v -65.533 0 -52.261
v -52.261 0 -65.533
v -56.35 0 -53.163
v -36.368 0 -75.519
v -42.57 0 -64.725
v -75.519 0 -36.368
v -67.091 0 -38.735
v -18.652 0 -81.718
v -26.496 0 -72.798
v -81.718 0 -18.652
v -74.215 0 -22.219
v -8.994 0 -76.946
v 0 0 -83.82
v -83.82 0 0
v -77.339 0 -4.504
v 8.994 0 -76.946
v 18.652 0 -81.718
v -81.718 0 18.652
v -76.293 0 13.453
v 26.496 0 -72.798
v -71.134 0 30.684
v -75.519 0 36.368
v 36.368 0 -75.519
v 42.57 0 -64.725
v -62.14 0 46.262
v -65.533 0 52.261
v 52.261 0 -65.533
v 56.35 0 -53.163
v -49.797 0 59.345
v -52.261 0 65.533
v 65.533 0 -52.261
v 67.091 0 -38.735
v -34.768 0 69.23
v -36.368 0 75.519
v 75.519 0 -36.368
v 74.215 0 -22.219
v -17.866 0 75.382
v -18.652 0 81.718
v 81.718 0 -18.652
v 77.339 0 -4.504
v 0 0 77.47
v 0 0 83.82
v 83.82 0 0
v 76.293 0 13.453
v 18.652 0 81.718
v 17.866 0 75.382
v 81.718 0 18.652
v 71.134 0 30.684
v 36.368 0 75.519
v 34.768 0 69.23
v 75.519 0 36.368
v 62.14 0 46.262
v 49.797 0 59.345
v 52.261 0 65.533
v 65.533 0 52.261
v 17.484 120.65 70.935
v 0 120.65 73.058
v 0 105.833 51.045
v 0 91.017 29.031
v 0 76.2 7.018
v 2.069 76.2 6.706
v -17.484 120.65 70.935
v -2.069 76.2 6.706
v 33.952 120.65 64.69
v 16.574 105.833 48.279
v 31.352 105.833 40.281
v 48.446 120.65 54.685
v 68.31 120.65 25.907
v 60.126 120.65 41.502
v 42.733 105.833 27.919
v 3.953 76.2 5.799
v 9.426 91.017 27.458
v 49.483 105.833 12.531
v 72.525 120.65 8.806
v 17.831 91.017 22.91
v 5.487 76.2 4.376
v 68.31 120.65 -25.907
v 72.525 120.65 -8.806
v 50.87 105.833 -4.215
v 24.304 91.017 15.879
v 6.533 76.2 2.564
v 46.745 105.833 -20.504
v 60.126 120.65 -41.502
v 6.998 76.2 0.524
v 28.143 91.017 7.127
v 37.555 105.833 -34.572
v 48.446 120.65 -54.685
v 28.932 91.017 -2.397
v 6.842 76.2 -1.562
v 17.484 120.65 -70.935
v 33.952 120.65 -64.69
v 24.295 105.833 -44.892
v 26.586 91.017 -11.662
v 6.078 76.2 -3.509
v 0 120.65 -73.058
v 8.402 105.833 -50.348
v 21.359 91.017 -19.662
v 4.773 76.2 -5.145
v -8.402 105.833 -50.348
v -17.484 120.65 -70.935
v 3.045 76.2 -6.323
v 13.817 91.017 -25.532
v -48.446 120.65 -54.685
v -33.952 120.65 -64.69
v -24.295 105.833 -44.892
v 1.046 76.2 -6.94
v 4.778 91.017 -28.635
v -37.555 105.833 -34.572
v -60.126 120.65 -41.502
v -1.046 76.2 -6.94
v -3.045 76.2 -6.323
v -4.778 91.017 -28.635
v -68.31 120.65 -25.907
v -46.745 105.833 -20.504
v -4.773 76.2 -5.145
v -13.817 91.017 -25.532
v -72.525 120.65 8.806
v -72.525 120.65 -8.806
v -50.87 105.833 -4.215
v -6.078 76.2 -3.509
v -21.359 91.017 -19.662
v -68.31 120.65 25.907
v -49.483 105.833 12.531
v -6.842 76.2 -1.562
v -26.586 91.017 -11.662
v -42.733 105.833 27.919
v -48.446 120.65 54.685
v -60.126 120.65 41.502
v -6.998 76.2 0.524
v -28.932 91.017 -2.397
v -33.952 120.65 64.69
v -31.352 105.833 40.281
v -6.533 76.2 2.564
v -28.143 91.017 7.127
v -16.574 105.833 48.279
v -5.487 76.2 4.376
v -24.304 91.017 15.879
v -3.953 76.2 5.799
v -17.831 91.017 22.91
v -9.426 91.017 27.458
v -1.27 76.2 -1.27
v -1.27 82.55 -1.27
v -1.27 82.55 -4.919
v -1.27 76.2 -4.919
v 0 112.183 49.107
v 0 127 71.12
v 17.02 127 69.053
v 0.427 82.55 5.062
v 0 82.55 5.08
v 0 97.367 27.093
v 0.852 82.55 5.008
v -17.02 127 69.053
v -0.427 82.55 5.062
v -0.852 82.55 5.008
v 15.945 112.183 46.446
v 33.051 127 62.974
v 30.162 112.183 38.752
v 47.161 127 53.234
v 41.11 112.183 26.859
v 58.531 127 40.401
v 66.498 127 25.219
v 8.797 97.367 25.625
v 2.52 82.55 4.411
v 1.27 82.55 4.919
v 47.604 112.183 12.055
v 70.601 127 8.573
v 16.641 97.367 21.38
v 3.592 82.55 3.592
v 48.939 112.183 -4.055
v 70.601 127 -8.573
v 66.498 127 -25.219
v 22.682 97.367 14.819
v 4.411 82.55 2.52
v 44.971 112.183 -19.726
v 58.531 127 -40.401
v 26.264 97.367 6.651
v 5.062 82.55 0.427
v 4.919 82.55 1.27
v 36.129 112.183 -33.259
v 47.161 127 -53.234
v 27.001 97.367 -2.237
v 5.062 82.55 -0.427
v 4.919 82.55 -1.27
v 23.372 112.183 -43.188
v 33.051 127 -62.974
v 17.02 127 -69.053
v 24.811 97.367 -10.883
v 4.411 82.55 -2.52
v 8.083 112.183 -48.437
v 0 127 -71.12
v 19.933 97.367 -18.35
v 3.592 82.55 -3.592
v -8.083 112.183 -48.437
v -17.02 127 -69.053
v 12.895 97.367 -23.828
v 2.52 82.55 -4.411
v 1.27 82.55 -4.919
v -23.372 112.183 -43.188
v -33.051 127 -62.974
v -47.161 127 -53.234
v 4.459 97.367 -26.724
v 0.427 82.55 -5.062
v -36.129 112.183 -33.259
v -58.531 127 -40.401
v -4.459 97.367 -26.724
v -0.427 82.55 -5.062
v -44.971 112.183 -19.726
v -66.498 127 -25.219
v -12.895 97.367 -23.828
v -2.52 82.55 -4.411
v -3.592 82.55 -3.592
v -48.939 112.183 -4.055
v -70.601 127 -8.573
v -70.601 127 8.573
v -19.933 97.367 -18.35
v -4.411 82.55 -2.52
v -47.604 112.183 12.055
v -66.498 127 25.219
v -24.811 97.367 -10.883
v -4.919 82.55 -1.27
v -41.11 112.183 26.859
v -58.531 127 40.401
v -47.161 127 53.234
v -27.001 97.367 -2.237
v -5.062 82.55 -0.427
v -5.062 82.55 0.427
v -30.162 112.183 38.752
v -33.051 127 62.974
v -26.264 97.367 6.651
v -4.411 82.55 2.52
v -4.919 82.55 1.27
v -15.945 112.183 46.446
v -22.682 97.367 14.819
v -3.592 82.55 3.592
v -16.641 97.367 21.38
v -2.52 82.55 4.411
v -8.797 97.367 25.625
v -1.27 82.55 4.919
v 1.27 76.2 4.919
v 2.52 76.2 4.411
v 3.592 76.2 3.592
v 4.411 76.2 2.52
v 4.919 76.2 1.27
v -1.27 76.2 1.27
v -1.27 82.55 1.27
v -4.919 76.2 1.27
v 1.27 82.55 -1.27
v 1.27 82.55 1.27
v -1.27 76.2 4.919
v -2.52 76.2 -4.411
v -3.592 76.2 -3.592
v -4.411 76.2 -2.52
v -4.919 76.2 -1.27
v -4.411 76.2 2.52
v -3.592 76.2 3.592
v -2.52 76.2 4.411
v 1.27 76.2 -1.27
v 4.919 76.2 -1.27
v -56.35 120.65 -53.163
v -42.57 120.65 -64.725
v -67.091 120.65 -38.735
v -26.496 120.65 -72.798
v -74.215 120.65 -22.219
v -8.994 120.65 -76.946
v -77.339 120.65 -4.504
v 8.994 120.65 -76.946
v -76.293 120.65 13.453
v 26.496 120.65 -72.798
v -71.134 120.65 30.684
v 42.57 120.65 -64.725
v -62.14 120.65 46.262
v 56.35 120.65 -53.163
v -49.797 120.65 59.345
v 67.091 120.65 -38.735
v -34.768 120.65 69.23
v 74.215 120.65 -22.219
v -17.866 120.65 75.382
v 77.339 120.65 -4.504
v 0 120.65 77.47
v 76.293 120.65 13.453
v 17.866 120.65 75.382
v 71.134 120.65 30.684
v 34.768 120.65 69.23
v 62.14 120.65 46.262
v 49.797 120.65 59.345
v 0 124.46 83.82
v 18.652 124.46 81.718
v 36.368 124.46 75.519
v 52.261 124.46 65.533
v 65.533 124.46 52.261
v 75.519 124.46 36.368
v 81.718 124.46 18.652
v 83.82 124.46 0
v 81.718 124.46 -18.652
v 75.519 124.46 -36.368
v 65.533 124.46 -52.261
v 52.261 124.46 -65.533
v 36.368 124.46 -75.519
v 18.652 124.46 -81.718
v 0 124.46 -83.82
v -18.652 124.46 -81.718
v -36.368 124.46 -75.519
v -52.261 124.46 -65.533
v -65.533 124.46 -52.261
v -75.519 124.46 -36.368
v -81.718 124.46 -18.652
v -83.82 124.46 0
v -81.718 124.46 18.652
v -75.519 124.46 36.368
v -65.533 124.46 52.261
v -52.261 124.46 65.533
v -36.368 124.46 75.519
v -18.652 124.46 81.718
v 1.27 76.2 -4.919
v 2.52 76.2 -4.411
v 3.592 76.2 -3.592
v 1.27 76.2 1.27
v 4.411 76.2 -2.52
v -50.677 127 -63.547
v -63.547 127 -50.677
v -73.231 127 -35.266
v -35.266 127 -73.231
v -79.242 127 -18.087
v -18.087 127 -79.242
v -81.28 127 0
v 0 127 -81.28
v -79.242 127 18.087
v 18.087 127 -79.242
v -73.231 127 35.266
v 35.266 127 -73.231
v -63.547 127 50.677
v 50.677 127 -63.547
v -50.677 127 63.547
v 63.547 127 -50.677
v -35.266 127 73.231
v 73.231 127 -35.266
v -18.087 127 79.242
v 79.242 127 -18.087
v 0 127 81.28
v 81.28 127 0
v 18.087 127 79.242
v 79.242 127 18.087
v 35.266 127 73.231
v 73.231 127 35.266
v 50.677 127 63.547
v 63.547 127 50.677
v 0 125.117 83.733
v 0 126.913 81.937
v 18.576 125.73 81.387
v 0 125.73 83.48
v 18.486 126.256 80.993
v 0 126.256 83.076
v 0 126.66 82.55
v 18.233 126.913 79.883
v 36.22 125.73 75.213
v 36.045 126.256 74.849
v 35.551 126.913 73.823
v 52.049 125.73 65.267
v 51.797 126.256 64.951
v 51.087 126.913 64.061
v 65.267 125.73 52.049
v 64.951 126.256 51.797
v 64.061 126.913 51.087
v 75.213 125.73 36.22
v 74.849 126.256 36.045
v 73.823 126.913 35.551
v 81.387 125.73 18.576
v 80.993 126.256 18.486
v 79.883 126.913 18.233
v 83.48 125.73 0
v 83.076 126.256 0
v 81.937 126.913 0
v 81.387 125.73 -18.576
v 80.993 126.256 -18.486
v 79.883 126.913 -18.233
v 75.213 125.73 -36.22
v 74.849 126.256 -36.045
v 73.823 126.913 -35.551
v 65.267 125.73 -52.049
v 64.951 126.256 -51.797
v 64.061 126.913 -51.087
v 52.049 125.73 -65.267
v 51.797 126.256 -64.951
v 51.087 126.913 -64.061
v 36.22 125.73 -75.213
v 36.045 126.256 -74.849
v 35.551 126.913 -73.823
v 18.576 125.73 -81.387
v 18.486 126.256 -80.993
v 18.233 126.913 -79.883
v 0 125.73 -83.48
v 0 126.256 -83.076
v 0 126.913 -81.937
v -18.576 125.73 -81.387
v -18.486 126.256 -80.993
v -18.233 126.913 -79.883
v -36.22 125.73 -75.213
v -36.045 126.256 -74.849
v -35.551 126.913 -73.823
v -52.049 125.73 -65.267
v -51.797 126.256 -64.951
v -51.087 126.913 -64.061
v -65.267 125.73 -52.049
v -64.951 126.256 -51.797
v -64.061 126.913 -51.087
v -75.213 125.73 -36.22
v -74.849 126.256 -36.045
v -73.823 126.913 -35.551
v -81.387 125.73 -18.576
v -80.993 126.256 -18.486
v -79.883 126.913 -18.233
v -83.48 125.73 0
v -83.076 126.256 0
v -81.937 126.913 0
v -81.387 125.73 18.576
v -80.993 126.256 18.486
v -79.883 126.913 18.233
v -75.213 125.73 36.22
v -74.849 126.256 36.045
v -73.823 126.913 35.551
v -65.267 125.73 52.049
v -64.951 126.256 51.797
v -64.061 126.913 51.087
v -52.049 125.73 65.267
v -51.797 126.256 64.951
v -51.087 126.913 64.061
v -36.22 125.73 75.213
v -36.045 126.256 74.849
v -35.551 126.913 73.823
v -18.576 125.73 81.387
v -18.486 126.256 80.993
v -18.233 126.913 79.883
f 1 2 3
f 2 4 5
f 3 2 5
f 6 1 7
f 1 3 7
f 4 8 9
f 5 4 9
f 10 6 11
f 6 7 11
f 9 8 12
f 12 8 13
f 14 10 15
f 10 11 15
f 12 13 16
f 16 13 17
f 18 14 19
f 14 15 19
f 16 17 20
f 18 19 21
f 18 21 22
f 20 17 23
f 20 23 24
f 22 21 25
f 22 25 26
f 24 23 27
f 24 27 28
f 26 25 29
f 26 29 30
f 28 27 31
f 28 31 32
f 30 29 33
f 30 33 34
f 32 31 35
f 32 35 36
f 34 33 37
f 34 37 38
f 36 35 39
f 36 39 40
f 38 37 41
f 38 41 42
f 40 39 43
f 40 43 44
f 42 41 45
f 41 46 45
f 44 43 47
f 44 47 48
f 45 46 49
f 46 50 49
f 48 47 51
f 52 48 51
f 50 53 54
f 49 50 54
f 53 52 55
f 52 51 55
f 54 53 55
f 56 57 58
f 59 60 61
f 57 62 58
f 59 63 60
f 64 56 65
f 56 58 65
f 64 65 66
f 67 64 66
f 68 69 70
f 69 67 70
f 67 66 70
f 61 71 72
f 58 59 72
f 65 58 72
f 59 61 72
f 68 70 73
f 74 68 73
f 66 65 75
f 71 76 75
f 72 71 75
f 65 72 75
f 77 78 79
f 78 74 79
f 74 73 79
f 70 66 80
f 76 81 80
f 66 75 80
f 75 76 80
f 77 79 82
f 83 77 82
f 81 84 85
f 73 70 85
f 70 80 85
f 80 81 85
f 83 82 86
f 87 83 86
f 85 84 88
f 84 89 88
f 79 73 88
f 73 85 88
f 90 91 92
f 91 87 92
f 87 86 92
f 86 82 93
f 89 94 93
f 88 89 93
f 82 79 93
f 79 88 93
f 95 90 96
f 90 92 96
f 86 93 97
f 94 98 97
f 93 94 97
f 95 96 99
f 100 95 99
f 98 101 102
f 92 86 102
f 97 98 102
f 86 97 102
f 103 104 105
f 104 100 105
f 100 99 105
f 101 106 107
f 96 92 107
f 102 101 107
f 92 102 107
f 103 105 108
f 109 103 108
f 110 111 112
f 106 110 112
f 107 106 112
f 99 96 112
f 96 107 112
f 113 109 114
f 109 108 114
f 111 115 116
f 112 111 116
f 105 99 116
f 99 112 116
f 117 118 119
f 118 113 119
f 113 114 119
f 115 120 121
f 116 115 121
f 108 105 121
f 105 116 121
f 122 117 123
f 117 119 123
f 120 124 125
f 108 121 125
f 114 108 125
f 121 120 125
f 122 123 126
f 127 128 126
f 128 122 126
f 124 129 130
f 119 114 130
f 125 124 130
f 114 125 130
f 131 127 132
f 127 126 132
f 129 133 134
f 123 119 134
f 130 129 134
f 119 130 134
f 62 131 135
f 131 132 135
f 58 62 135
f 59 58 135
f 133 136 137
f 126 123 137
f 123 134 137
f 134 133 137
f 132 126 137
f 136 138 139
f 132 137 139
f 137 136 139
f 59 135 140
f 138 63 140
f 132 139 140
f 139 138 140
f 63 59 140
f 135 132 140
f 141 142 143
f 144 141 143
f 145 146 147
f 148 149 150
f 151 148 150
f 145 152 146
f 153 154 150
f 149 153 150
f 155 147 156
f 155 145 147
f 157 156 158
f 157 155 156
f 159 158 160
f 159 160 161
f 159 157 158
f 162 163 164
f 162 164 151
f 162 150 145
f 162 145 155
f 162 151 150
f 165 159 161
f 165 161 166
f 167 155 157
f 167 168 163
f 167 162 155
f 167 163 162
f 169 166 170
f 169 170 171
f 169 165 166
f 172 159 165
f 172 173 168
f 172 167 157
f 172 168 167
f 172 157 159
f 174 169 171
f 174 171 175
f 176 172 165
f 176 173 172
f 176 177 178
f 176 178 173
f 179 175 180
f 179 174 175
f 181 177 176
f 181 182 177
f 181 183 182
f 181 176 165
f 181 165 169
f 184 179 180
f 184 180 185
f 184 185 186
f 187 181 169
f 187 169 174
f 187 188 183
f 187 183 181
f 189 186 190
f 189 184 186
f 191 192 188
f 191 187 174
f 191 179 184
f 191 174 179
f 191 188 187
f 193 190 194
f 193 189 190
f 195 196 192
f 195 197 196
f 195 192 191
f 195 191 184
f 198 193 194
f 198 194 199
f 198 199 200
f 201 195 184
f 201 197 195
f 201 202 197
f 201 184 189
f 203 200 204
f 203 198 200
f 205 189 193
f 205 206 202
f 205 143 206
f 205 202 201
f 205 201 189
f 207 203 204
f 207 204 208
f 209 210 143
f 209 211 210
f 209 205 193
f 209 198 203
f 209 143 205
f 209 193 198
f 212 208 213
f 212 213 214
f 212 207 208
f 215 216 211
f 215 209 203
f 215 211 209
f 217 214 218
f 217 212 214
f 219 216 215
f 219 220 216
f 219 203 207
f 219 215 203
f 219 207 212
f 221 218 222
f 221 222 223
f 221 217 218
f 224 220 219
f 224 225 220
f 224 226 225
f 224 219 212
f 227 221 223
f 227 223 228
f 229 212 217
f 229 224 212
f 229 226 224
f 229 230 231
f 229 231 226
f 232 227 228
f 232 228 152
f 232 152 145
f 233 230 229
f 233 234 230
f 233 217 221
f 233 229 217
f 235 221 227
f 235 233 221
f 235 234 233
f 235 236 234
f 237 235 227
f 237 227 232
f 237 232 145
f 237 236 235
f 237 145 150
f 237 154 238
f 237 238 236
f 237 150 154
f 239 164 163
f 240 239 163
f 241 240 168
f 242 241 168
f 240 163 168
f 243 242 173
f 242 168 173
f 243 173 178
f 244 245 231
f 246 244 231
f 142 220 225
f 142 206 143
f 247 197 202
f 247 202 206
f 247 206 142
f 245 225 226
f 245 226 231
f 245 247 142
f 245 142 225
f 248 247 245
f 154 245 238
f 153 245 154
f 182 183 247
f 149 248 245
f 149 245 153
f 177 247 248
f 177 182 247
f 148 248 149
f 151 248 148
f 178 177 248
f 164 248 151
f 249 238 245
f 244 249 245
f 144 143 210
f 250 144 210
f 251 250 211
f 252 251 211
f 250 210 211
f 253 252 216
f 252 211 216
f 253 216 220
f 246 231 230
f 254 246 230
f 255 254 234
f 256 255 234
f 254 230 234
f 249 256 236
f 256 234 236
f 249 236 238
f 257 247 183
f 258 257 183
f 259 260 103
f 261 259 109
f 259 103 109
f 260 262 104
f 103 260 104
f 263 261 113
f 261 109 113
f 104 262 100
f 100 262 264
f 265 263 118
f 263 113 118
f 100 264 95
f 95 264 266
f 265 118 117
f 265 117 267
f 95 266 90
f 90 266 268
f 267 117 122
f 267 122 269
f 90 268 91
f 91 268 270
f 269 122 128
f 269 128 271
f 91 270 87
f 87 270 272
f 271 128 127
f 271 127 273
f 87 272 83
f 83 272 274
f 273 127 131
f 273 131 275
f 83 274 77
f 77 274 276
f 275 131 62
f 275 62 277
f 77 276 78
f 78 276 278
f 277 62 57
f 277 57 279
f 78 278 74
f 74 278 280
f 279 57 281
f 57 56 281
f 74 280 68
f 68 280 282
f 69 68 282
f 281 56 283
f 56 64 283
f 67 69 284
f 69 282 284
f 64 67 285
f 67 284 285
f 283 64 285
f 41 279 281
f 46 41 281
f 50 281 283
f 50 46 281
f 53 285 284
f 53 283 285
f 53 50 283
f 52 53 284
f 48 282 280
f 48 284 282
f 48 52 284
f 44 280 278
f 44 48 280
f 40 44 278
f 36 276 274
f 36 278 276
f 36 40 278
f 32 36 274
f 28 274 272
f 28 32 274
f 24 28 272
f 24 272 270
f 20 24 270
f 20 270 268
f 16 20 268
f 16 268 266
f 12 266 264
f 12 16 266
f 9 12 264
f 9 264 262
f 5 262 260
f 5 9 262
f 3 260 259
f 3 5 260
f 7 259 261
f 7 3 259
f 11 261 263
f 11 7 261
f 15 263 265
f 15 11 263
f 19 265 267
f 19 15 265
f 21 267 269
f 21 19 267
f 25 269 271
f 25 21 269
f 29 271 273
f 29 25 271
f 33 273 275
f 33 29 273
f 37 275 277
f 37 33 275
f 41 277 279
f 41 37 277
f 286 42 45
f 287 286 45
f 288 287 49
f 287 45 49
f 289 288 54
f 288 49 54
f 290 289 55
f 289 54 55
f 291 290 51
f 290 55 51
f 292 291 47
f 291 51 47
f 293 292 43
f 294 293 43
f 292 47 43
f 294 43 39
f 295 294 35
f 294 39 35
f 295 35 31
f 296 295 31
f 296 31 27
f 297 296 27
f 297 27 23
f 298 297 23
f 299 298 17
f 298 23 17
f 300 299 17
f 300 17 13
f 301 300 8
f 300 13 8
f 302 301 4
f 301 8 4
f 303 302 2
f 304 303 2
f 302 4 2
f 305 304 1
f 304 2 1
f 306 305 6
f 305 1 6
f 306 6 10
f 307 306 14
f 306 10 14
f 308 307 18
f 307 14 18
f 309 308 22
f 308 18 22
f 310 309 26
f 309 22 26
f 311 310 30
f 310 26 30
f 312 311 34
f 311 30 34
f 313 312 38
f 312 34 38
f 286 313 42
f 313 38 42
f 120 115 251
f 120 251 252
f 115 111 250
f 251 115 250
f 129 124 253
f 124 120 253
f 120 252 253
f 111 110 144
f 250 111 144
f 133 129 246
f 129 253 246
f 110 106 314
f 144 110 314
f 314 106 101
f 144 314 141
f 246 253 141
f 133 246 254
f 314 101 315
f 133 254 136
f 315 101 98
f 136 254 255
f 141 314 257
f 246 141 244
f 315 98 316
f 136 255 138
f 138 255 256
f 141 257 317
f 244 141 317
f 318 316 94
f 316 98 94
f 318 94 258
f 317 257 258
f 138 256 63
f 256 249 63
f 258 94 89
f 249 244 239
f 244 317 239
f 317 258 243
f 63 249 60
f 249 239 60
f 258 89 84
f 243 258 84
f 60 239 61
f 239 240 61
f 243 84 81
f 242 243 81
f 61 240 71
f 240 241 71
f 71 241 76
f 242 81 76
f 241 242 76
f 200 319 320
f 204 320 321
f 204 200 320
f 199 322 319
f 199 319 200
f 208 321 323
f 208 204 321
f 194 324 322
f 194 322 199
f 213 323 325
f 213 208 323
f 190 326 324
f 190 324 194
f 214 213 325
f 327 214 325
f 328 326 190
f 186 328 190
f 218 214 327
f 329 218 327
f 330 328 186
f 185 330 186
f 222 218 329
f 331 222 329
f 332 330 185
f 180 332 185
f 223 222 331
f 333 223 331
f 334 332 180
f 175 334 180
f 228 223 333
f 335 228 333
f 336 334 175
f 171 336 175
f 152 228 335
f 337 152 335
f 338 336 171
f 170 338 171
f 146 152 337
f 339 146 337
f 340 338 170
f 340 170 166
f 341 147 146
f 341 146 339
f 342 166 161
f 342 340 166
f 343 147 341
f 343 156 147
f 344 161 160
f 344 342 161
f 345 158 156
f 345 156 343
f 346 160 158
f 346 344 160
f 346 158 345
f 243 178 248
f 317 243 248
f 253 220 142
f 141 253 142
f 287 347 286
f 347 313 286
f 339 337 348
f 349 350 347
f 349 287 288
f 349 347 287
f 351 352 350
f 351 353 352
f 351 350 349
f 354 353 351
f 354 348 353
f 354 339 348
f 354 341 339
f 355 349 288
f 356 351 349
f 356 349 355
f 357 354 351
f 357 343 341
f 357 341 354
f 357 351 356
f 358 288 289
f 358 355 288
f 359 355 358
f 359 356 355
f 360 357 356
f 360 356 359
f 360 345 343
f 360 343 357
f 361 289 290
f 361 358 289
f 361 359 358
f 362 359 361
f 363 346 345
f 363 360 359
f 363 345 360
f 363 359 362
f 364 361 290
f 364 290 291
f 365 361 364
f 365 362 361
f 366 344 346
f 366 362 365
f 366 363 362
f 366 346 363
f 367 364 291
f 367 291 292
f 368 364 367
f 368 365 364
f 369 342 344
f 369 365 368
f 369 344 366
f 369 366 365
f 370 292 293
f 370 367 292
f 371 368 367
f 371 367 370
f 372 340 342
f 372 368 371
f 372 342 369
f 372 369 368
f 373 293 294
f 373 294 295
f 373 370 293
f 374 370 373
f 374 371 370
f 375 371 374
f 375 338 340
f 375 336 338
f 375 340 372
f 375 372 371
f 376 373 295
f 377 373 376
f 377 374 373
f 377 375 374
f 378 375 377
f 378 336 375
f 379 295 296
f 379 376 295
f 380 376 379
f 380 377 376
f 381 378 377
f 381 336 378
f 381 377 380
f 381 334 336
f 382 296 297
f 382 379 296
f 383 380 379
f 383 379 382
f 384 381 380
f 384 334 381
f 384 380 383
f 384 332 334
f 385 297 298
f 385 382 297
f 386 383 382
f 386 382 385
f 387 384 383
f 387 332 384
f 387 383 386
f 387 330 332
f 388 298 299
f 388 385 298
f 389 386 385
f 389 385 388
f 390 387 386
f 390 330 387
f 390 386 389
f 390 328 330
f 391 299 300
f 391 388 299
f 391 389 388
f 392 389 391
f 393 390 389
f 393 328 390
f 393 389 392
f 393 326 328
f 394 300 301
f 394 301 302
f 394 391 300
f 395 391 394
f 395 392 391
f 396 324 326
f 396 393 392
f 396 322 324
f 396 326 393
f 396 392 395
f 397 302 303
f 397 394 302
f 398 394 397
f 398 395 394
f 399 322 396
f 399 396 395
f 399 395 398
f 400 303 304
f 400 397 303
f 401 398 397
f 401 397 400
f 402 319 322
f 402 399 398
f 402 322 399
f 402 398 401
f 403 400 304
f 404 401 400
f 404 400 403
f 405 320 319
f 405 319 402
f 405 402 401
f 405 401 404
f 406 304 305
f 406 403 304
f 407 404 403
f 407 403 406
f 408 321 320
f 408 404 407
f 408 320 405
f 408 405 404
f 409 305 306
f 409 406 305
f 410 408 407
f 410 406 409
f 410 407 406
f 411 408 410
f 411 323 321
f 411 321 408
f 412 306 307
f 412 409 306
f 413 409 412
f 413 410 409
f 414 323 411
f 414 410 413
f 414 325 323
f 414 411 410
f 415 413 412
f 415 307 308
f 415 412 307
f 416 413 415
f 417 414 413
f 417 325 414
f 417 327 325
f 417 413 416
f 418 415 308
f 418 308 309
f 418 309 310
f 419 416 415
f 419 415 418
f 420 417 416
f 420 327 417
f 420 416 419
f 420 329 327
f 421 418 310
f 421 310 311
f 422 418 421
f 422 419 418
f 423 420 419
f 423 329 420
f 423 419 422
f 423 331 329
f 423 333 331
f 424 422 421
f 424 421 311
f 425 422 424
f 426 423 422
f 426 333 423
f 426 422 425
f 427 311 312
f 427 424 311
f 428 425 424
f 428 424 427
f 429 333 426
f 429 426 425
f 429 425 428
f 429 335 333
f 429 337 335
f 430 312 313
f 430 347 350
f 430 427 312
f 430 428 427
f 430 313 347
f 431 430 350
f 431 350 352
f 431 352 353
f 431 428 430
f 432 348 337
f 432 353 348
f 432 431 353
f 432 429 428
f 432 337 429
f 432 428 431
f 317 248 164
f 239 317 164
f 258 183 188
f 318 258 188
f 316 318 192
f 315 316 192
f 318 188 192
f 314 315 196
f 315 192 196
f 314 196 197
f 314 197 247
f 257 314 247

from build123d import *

# Parameters (mm, degrees)
SKETCH1_R           = 83.82
BOSS_EXTRUDE1_DEPTH = 127
SHELL1_T            = -6.35
CUT_EXTRUDE2_REACH  = 146.451
FILLET2_R           = 2.54


with BuildPart() as part:
    # Sketch1 → Boss-Extrude1 (new body)
    with BuildSketch(Plane(origin=(0, 0, 0), x_dir=(1, 0, 0), z_dir=(0, 1, 0))):
        with Locations(Location((0, 0, 0), (0, 0, 270))):
            Circle(SKETCH1_R)
    extrude(amount=BOSS_EXTRUDE1_DEPTH)

    # Sketch2 → Cut-Revolve1 (revolve, cut)
    with BuildSketch(Plane.XY, mode=Mode.PRIVATE) as cut_revolve1_sk:
        Polygon((-5.08, 82.55), (0, 82.55), (0, 127), (-71.12, 127), align=None)
    revolve(cut_revolve1_sk.sketch.rotate(Axis((0, 0, 0), (0, 1, 0)), 90), axis=Axis((0, 0, 0), (0, 1, 0)), mode=Mode.SUBTRACT)

    # Shell1
    shell1_openings = [part.faces().sort_by_distance(p)[0] for p in [
        (0, 0, 0),
    ]]
    offset(amount=SHELL1_T, openings=shell1_openings, kind=Kind.INTERSECTION)

    # Sketch4 → Cut-Extrude2 (cut, up to next)
    with BuildSketch(Plane(origin=(0, 82.55, 0), x_dir=(1, 0, 0), z_dir=(0, 1, 0)), mode=Mode.PRIVATE) as cut_extrude2_sk1:
        with BuildLine():
            Line((-1.27, 1.27), (-1.27, 4.91868885))
            ThreePointArc((-1.27, 4.91868885), (-3.592102448, 3.592102448), (-4.91868885, 1.27))
            Line((-4.91868885, 1.27), (-1.27, 1.27))
        make_face()
    cut_extrude2_tool1 = extrude(cut_extrude2_sk1.sketch, amount=-CUT_EXTRUDE2_REACH, mode=Mode.PRIVATE) & part.part
    # Sketch4 → Cut-Extrude2 (cut, up to next)
    with BuildSketch(Plane(origin=(0, 82.55, 0), x_dir=(1, 0, 0), z_dir=(0, 1, 0)), mode=Mode.PRIVATE) as cut_extrude2_sk2:
        with BuildLine():
            ThreePointArc((4.91868885, 1.27), (3.592102448, 3.592102448), (1.27, 4.91868885))
            Line((1.27, 4.91868885), (1.27, 1.27))
            Line((1.27, 1.27), (4.91868885, 1.27))
        make_face()
    cut_extrude2_tool2 = extrude(cut_extrude2_sk2.sketch, amount=-CUT_EXTRUDE2_REACH, mode=Mode.PRIVATE) & part.part
    # Sketch4 → Cut-Extrude2 (cut, up to next)
    with BuildSketch(Plane(origin=(0, 82.55, 0), x_dir=(1, 0, 0), z_dir=(0, 1, 0)), mode=Mode.PRIVATE) as cut_extrude2_sk3:
        with BuildLine():
            Line((-1.27, -4.91868885), (-1.27, -1.27))
            Line((-1.27, -1.27), (-4.91868885, -1.27))
            ThreePointArc((-4.91868885, -1.27), (-3.592102448, -3.592102448), (-1.27, -4.91868885))
        make_face()
    cut_extrude2_tool3 = extrude(cut_extrude2_sk3.sketch, amount=-CUT_EXTRUDE2_REACH, mode=Mode.PRIVATE) & part.part
    # Sketch4 → Cut-Extrude2 (cut, up to next)
    with BuildSketch(Plane(origin=(0, 82.55, 0), x_dir=(1, 0, 0), z_dir=(0, 1, 0)), mode=Mode.PRIVATE) as cut_extrude2_sk4:
        with BuildLine():
            Line((4.91868885, -1.27), (1.27, -1.27))
            Line((1.27, -1.27), (1.27, -4.91868885))
            ThreePointArc((1.27, -4.91868885), (3.592102448, -3.592102448), (4.91868885, -1.27))
        make_face()
    cut_extrude2_tool4 = extrude(cut_extrude2_sk4.sketch, amount=-CUT_EXTRUDE2_REACH, mode=Mode.PRIVATE) & part.part
    add(cut_extrude2_tool1.solids().sort_by_distance((-2.704204, 82.55, -2.704204))[0], mode=Mode.SUBTRACT)
    add(cut_extrude2_tool2.solids().sort_by_distance((2.704204, 82.55, -2.704204))[0], mode=Mode.SUBTRACT)
    add(cut_extrude2_tool3.solids().sort_by_distance((-2.704204, 82.55, 2.704204))[0], mode=Mode.SUBTRACT)
    add(cut_extrude2_tool4.solids().sort_by_distance((2.704204, 82.55, 2.704204))[0], mode=Mode.SUBTRACT)

    # Fillet2
    fillet2_edges = [part.edges().sort_by_distance(p)[0] for p in [
        (0, 127, -83.82),
    ]]
    fillet(fillet2_edges, radius=FILLET2_R)


solid = part.part
